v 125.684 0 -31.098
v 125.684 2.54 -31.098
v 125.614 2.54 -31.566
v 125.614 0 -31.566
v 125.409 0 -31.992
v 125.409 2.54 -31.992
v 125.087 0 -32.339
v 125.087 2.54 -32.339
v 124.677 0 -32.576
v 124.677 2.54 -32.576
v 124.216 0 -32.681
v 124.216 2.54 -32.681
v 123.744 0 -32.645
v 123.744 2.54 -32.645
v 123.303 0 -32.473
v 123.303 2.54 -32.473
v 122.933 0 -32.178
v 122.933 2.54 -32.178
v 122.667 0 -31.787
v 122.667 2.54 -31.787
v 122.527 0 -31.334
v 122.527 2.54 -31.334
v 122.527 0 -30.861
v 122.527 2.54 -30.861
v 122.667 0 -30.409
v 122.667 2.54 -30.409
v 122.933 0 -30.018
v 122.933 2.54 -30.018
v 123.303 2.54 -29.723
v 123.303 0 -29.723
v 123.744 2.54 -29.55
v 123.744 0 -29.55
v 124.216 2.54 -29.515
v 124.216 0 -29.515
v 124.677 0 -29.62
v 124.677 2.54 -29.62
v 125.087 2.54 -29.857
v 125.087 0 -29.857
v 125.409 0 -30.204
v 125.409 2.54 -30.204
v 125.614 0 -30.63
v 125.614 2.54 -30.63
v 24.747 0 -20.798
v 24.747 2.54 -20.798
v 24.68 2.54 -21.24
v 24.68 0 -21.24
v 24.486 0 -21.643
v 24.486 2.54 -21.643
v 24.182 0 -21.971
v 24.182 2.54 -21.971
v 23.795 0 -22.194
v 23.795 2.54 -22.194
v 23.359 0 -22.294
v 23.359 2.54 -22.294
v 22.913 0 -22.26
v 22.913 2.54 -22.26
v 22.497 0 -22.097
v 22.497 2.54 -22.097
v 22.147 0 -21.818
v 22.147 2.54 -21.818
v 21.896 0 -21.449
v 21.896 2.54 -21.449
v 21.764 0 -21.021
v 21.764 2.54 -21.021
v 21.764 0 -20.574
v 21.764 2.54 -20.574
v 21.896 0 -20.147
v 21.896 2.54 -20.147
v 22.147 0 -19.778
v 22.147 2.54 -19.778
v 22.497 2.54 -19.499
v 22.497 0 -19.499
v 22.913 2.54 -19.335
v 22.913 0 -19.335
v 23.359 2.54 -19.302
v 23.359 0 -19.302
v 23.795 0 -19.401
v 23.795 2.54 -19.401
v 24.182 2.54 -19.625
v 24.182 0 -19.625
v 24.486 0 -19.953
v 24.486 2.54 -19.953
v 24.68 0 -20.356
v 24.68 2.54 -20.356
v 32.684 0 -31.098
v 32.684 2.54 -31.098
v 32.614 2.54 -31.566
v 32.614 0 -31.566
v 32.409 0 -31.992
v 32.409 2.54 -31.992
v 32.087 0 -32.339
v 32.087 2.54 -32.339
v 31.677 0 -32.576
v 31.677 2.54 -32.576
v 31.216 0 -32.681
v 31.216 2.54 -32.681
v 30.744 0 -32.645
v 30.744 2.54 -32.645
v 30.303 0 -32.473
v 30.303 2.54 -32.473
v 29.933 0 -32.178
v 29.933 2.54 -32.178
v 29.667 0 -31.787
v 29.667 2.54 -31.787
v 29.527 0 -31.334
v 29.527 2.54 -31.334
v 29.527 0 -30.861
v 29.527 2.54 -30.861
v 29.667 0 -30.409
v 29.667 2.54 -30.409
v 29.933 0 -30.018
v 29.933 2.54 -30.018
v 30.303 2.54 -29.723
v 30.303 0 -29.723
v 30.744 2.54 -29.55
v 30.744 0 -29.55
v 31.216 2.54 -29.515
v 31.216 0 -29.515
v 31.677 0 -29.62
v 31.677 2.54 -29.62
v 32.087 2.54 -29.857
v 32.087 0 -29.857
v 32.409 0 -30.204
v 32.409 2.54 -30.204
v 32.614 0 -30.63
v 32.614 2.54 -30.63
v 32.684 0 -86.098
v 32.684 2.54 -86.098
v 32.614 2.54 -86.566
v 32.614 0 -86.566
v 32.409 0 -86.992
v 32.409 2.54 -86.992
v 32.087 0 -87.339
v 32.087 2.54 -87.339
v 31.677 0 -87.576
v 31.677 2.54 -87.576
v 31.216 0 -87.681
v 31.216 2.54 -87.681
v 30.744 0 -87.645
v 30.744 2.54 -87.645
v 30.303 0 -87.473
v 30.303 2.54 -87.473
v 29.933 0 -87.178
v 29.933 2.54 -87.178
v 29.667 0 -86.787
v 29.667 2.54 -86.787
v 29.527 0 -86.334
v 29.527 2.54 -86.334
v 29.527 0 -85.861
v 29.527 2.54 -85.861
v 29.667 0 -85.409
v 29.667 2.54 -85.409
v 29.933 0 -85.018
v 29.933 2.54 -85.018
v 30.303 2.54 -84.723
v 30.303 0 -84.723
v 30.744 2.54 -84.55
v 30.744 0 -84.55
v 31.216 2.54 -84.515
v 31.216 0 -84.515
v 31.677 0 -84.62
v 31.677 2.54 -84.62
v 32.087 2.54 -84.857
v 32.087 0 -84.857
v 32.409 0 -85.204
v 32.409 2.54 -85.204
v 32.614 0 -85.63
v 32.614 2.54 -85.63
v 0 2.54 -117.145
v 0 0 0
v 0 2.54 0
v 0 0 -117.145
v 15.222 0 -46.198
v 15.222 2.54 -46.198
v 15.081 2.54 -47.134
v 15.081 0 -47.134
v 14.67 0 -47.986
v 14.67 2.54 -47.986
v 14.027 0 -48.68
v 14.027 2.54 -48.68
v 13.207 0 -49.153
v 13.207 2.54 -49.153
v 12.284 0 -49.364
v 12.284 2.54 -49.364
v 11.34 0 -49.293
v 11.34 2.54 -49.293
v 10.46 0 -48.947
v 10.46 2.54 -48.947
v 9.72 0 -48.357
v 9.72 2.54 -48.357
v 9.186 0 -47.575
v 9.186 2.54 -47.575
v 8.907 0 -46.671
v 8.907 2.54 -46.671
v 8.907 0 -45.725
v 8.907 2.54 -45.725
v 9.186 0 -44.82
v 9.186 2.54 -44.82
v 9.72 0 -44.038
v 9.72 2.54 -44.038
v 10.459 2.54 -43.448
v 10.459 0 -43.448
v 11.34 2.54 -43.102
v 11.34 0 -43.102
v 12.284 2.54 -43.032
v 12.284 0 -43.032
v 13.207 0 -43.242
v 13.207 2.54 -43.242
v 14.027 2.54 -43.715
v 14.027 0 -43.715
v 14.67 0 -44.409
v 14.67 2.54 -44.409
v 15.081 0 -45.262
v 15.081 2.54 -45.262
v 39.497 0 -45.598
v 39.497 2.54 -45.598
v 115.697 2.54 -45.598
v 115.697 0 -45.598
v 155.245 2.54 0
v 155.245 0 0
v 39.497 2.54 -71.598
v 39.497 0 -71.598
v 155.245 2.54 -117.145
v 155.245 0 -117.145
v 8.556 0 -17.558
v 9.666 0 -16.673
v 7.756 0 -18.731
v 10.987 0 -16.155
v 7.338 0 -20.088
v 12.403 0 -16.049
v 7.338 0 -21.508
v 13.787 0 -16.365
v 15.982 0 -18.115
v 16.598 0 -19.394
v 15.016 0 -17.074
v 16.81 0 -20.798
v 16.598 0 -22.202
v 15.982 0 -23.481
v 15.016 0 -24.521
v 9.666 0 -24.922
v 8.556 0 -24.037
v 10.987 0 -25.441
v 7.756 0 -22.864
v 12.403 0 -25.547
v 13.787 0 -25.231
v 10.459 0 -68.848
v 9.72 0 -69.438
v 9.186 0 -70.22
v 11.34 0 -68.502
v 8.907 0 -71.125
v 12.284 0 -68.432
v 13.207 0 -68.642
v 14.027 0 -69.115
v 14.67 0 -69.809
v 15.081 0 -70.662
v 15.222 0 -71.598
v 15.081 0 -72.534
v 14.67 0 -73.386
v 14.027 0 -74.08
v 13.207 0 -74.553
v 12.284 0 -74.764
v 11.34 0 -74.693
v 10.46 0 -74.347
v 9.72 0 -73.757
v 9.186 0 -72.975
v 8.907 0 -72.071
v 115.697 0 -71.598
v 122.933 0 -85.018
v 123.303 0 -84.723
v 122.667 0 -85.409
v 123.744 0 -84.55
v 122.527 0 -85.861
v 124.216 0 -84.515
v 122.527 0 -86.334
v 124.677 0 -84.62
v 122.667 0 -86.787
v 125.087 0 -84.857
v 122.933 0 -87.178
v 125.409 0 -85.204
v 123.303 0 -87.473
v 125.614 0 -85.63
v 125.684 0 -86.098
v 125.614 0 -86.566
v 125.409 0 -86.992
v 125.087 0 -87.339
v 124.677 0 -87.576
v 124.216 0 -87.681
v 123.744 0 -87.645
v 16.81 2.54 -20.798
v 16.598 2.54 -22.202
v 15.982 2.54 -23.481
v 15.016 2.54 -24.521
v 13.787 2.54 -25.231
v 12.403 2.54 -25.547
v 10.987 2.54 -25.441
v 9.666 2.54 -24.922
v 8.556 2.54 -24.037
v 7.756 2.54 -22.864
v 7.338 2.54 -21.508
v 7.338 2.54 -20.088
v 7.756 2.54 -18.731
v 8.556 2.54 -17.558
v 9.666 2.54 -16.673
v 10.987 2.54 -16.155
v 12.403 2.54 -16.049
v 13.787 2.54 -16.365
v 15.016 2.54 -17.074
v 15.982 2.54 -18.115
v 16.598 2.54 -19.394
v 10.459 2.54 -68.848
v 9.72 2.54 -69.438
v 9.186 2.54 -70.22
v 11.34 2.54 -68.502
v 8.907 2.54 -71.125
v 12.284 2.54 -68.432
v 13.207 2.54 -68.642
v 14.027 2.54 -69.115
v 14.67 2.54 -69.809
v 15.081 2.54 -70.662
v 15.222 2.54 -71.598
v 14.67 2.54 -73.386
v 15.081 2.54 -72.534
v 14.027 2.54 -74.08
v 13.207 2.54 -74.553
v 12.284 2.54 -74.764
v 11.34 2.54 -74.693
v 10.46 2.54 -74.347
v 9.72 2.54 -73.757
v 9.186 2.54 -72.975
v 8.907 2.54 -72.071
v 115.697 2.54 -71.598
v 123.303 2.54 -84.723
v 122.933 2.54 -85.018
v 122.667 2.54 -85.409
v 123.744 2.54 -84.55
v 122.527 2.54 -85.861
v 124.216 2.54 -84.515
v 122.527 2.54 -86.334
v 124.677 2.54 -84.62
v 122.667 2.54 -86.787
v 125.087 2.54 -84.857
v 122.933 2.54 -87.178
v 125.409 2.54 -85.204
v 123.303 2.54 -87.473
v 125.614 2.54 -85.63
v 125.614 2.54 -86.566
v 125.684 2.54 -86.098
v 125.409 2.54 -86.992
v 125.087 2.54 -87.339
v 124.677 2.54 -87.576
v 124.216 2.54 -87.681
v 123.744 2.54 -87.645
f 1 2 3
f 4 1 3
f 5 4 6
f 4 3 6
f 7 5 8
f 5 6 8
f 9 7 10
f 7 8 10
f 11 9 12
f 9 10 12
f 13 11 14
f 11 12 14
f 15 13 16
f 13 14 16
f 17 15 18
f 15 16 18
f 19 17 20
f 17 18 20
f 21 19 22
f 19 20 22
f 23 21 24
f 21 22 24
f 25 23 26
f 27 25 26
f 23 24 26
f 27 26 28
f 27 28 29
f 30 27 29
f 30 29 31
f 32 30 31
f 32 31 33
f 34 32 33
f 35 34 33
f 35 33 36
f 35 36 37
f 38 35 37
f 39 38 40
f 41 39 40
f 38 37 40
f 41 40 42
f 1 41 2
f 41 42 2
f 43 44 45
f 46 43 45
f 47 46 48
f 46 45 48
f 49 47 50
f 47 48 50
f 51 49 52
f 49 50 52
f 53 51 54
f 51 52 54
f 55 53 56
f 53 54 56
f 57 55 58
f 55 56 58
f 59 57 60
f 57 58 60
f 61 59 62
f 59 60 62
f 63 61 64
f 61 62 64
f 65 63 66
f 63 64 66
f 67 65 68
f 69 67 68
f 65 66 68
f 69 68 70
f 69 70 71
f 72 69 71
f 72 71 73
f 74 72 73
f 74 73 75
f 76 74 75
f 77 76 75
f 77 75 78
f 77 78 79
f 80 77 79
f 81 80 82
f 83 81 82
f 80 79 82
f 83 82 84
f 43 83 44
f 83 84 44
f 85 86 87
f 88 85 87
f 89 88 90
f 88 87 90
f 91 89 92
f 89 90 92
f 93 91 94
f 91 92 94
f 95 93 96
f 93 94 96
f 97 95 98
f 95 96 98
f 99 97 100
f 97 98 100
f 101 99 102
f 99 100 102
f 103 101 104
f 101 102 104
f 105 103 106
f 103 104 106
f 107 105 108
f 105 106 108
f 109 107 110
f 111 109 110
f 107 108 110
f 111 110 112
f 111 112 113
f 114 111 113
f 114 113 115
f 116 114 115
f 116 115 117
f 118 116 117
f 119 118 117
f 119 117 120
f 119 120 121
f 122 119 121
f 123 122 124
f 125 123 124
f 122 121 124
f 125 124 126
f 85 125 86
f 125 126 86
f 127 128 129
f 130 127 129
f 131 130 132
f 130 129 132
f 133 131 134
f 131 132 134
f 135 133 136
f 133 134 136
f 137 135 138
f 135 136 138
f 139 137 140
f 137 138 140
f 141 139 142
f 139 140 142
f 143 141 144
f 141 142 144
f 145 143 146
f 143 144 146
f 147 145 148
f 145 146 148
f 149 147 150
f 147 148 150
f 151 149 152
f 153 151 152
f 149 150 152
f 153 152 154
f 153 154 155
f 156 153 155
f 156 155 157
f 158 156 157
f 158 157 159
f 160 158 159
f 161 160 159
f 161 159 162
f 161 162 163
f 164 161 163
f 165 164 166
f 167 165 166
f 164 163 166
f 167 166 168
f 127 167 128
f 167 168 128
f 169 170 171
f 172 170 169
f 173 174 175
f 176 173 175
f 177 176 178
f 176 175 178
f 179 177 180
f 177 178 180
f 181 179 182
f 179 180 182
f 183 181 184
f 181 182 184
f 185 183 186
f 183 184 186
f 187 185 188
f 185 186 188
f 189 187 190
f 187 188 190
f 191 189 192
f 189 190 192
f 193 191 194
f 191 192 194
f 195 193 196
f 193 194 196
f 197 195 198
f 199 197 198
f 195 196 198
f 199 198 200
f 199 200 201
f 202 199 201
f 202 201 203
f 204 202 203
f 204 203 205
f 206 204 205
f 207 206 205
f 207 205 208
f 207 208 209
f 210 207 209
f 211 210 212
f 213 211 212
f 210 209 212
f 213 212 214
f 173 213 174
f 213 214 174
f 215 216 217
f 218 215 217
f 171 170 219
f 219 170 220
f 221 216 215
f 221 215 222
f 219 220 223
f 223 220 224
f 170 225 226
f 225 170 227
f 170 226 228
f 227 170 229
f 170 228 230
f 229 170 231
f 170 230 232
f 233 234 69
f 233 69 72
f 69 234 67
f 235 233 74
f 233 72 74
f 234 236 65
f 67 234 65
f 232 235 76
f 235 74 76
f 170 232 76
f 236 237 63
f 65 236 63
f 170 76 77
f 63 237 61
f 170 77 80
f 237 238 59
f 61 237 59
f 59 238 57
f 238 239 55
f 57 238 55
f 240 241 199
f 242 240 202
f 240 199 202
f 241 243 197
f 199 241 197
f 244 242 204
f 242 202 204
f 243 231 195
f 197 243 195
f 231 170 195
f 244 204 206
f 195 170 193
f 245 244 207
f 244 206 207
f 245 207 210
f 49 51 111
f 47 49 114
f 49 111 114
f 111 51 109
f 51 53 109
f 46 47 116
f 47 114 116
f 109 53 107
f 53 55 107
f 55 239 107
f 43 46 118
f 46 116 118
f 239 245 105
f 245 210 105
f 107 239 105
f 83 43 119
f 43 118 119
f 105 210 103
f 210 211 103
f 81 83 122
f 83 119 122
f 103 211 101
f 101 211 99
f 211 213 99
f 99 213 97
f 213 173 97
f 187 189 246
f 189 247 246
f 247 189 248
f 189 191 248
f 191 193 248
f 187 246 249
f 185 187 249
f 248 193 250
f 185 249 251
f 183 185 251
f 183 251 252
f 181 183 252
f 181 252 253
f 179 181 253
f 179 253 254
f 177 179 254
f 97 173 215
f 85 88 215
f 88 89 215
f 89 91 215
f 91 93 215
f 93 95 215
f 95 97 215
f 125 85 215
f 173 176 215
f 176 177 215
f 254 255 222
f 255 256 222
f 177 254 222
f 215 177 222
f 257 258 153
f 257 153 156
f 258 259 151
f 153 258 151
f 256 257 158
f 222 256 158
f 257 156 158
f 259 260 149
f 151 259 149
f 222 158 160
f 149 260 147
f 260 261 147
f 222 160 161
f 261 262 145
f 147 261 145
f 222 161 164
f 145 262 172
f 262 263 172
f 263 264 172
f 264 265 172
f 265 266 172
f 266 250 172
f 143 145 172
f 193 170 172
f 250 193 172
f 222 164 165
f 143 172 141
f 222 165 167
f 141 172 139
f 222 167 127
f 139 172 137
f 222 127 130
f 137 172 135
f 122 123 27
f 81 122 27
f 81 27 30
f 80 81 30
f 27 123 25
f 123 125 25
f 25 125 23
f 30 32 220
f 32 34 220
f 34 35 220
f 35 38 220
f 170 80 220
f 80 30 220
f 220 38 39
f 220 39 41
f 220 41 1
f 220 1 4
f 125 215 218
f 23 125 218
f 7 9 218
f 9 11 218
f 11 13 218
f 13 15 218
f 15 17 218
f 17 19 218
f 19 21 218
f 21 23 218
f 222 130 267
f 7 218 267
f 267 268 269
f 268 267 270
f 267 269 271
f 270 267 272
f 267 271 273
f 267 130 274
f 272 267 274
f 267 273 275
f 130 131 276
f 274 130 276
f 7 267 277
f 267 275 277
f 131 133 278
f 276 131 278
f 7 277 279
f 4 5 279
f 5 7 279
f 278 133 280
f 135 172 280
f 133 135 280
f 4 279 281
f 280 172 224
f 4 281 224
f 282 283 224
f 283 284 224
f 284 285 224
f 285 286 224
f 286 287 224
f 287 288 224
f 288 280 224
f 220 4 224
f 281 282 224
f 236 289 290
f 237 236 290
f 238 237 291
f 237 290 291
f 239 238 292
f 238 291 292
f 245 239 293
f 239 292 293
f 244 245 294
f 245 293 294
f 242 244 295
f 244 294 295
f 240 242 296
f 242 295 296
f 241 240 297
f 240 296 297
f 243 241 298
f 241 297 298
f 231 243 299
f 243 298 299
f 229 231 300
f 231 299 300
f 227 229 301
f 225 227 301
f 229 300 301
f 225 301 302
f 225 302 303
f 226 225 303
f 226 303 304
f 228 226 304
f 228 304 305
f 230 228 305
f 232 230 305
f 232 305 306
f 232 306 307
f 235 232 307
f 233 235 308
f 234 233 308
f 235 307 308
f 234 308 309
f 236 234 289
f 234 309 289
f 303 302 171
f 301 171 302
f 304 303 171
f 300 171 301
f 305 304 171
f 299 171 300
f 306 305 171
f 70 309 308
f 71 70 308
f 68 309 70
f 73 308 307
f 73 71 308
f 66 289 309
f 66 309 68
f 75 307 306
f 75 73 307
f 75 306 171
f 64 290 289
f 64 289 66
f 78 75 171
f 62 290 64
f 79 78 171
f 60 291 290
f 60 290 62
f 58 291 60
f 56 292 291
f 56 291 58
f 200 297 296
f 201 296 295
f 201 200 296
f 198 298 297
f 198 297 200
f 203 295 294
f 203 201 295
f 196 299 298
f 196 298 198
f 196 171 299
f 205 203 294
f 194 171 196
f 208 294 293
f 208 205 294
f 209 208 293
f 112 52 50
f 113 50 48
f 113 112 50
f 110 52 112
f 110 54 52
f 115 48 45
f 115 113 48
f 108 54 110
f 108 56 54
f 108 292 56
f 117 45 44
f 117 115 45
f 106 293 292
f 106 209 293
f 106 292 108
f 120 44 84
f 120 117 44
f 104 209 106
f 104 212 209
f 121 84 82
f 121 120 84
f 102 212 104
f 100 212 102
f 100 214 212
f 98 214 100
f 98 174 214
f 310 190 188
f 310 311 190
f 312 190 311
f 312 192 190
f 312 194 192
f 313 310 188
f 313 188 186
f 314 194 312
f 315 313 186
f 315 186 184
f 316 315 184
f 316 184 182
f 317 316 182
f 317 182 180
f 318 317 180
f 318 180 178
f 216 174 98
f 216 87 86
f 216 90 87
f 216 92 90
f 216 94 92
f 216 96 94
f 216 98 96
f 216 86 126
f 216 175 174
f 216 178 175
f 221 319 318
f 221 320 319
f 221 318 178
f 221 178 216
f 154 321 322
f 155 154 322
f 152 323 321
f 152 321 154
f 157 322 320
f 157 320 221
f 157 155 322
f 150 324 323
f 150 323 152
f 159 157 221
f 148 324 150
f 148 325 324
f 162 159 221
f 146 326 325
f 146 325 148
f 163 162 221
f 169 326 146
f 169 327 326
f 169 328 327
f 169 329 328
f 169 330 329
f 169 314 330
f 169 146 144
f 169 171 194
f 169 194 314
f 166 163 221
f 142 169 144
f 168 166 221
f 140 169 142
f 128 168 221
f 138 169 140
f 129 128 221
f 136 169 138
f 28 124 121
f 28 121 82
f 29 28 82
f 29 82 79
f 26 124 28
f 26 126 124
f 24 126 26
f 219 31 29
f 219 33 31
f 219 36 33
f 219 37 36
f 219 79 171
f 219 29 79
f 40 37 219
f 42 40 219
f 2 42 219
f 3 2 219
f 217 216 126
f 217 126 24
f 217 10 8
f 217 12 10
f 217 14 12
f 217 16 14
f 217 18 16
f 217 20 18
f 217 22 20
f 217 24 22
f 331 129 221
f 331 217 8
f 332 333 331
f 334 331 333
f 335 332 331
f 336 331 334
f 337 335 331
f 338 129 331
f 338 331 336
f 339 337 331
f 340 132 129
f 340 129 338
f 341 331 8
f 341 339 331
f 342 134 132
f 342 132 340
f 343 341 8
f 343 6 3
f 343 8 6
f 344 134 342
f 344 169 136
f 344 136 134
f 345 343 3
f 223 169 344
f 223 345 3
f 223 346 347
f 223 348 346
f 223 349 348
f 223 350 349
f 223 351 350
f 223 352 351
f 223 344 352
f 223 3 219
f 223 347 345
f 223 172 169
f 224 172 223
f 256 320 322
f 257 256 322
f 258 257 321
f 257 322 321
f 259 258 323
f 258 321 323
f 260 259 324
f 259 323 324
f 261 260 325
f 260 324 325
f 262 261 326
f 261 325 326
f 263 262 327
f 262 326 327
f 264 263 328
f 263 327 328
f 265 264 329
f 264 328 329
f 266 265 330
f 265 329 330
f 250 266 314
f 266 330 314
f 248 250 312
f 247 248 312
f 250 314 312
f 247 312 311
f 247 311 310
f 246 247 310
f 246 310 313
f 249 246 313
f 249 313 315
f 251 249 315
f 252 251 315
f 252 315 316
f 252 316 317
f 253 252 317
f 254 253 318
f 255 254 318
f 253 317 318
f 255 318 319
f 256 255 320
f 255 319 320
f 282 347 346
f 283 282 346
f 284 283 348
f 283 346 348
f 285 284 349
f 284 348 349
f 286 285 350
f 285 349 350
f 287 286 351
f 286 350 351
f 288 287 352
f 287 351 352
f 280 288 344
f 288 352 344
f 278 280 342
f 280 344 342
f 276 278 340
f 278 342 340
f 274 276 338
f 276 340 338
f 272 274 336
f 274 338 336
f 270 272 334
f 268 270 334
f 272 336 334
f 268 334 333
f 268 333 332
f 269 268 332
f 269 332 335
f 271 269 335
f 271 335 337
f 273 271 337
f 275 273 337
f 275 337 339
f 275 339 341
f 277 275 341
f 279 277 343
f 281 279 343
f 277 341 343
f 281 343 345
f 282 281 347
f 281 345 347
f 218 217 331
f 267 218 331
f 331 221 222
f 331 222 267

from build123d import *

# Parameters (mm, degrees)
SKETCH1_W           = 155.2448
SKETCH1_H           = 117.1448
BOSS_EXTRUDE1_DEPTH = 2.54
SKETCH2_R           = 1.5875
SKETCH2_R_2         = 3.175
SKETCH2_R_3         = 4.7625
SKETCH2_R_4         = 1.5
SKETCH2_W           = 76.2
SKETCH2_H           = 26
CUT_EXTRUDE1_DEPTH  = 2.54


with BuildPart() as part:
    # Sketch1 → Boss-Extrude1 (new body)
    with BuildSketch(Plane(origin=(0, 0, 0), x_dir=(1, 0, 0), z_dir=(0, 1, 0))):
        with Locations((77.6224, 58.5724)):
            Rectangle(SKETCH1_W, SKETCH1_H)
    extrude(amount=BOSS_EXTRUDE1_DEPTH)

    # Sketch2 → Cut-Extrude1 (cut)
    with BuildSketch(Plane(origin=(0, 2.54, 0), x_dir=(1, 0, 0), z_dir=(0, 1, 0))):
        with Locations((31.097, 86.0978)):
            Circle(SKETCH2_R)
        with Locations((31.097, 31.0978)):
            Circle(SKETCH2_R)
        with Locations((124.097, 86.0978)):
            Circle(SKETCH2_R)
        with Locations((124.097, 31.0978)):
            Circle(SKETCH2_R)
        with Locations((12.047, 71.5978)):
            Circle(SKETCH2_R_2)
        with Locations((12.047, 46.1978)):
            Circle(SKETCH2_R_2)
        with Locations((12.047, 20.7978)):
            Circle(SKETCH2_R_3)
        with Locations((23.247, 20.7978)):
            Circle(SKETCH2_R_4)
        with Locations((77.597, 58.5978)):
            Rectangle(SKETCH2_W, SKETCH2_H)
    extrude(amount=-CUT_EXTRUDE1_DEPTH, mode=Mode.SUBTRACT)


solid = part.part
